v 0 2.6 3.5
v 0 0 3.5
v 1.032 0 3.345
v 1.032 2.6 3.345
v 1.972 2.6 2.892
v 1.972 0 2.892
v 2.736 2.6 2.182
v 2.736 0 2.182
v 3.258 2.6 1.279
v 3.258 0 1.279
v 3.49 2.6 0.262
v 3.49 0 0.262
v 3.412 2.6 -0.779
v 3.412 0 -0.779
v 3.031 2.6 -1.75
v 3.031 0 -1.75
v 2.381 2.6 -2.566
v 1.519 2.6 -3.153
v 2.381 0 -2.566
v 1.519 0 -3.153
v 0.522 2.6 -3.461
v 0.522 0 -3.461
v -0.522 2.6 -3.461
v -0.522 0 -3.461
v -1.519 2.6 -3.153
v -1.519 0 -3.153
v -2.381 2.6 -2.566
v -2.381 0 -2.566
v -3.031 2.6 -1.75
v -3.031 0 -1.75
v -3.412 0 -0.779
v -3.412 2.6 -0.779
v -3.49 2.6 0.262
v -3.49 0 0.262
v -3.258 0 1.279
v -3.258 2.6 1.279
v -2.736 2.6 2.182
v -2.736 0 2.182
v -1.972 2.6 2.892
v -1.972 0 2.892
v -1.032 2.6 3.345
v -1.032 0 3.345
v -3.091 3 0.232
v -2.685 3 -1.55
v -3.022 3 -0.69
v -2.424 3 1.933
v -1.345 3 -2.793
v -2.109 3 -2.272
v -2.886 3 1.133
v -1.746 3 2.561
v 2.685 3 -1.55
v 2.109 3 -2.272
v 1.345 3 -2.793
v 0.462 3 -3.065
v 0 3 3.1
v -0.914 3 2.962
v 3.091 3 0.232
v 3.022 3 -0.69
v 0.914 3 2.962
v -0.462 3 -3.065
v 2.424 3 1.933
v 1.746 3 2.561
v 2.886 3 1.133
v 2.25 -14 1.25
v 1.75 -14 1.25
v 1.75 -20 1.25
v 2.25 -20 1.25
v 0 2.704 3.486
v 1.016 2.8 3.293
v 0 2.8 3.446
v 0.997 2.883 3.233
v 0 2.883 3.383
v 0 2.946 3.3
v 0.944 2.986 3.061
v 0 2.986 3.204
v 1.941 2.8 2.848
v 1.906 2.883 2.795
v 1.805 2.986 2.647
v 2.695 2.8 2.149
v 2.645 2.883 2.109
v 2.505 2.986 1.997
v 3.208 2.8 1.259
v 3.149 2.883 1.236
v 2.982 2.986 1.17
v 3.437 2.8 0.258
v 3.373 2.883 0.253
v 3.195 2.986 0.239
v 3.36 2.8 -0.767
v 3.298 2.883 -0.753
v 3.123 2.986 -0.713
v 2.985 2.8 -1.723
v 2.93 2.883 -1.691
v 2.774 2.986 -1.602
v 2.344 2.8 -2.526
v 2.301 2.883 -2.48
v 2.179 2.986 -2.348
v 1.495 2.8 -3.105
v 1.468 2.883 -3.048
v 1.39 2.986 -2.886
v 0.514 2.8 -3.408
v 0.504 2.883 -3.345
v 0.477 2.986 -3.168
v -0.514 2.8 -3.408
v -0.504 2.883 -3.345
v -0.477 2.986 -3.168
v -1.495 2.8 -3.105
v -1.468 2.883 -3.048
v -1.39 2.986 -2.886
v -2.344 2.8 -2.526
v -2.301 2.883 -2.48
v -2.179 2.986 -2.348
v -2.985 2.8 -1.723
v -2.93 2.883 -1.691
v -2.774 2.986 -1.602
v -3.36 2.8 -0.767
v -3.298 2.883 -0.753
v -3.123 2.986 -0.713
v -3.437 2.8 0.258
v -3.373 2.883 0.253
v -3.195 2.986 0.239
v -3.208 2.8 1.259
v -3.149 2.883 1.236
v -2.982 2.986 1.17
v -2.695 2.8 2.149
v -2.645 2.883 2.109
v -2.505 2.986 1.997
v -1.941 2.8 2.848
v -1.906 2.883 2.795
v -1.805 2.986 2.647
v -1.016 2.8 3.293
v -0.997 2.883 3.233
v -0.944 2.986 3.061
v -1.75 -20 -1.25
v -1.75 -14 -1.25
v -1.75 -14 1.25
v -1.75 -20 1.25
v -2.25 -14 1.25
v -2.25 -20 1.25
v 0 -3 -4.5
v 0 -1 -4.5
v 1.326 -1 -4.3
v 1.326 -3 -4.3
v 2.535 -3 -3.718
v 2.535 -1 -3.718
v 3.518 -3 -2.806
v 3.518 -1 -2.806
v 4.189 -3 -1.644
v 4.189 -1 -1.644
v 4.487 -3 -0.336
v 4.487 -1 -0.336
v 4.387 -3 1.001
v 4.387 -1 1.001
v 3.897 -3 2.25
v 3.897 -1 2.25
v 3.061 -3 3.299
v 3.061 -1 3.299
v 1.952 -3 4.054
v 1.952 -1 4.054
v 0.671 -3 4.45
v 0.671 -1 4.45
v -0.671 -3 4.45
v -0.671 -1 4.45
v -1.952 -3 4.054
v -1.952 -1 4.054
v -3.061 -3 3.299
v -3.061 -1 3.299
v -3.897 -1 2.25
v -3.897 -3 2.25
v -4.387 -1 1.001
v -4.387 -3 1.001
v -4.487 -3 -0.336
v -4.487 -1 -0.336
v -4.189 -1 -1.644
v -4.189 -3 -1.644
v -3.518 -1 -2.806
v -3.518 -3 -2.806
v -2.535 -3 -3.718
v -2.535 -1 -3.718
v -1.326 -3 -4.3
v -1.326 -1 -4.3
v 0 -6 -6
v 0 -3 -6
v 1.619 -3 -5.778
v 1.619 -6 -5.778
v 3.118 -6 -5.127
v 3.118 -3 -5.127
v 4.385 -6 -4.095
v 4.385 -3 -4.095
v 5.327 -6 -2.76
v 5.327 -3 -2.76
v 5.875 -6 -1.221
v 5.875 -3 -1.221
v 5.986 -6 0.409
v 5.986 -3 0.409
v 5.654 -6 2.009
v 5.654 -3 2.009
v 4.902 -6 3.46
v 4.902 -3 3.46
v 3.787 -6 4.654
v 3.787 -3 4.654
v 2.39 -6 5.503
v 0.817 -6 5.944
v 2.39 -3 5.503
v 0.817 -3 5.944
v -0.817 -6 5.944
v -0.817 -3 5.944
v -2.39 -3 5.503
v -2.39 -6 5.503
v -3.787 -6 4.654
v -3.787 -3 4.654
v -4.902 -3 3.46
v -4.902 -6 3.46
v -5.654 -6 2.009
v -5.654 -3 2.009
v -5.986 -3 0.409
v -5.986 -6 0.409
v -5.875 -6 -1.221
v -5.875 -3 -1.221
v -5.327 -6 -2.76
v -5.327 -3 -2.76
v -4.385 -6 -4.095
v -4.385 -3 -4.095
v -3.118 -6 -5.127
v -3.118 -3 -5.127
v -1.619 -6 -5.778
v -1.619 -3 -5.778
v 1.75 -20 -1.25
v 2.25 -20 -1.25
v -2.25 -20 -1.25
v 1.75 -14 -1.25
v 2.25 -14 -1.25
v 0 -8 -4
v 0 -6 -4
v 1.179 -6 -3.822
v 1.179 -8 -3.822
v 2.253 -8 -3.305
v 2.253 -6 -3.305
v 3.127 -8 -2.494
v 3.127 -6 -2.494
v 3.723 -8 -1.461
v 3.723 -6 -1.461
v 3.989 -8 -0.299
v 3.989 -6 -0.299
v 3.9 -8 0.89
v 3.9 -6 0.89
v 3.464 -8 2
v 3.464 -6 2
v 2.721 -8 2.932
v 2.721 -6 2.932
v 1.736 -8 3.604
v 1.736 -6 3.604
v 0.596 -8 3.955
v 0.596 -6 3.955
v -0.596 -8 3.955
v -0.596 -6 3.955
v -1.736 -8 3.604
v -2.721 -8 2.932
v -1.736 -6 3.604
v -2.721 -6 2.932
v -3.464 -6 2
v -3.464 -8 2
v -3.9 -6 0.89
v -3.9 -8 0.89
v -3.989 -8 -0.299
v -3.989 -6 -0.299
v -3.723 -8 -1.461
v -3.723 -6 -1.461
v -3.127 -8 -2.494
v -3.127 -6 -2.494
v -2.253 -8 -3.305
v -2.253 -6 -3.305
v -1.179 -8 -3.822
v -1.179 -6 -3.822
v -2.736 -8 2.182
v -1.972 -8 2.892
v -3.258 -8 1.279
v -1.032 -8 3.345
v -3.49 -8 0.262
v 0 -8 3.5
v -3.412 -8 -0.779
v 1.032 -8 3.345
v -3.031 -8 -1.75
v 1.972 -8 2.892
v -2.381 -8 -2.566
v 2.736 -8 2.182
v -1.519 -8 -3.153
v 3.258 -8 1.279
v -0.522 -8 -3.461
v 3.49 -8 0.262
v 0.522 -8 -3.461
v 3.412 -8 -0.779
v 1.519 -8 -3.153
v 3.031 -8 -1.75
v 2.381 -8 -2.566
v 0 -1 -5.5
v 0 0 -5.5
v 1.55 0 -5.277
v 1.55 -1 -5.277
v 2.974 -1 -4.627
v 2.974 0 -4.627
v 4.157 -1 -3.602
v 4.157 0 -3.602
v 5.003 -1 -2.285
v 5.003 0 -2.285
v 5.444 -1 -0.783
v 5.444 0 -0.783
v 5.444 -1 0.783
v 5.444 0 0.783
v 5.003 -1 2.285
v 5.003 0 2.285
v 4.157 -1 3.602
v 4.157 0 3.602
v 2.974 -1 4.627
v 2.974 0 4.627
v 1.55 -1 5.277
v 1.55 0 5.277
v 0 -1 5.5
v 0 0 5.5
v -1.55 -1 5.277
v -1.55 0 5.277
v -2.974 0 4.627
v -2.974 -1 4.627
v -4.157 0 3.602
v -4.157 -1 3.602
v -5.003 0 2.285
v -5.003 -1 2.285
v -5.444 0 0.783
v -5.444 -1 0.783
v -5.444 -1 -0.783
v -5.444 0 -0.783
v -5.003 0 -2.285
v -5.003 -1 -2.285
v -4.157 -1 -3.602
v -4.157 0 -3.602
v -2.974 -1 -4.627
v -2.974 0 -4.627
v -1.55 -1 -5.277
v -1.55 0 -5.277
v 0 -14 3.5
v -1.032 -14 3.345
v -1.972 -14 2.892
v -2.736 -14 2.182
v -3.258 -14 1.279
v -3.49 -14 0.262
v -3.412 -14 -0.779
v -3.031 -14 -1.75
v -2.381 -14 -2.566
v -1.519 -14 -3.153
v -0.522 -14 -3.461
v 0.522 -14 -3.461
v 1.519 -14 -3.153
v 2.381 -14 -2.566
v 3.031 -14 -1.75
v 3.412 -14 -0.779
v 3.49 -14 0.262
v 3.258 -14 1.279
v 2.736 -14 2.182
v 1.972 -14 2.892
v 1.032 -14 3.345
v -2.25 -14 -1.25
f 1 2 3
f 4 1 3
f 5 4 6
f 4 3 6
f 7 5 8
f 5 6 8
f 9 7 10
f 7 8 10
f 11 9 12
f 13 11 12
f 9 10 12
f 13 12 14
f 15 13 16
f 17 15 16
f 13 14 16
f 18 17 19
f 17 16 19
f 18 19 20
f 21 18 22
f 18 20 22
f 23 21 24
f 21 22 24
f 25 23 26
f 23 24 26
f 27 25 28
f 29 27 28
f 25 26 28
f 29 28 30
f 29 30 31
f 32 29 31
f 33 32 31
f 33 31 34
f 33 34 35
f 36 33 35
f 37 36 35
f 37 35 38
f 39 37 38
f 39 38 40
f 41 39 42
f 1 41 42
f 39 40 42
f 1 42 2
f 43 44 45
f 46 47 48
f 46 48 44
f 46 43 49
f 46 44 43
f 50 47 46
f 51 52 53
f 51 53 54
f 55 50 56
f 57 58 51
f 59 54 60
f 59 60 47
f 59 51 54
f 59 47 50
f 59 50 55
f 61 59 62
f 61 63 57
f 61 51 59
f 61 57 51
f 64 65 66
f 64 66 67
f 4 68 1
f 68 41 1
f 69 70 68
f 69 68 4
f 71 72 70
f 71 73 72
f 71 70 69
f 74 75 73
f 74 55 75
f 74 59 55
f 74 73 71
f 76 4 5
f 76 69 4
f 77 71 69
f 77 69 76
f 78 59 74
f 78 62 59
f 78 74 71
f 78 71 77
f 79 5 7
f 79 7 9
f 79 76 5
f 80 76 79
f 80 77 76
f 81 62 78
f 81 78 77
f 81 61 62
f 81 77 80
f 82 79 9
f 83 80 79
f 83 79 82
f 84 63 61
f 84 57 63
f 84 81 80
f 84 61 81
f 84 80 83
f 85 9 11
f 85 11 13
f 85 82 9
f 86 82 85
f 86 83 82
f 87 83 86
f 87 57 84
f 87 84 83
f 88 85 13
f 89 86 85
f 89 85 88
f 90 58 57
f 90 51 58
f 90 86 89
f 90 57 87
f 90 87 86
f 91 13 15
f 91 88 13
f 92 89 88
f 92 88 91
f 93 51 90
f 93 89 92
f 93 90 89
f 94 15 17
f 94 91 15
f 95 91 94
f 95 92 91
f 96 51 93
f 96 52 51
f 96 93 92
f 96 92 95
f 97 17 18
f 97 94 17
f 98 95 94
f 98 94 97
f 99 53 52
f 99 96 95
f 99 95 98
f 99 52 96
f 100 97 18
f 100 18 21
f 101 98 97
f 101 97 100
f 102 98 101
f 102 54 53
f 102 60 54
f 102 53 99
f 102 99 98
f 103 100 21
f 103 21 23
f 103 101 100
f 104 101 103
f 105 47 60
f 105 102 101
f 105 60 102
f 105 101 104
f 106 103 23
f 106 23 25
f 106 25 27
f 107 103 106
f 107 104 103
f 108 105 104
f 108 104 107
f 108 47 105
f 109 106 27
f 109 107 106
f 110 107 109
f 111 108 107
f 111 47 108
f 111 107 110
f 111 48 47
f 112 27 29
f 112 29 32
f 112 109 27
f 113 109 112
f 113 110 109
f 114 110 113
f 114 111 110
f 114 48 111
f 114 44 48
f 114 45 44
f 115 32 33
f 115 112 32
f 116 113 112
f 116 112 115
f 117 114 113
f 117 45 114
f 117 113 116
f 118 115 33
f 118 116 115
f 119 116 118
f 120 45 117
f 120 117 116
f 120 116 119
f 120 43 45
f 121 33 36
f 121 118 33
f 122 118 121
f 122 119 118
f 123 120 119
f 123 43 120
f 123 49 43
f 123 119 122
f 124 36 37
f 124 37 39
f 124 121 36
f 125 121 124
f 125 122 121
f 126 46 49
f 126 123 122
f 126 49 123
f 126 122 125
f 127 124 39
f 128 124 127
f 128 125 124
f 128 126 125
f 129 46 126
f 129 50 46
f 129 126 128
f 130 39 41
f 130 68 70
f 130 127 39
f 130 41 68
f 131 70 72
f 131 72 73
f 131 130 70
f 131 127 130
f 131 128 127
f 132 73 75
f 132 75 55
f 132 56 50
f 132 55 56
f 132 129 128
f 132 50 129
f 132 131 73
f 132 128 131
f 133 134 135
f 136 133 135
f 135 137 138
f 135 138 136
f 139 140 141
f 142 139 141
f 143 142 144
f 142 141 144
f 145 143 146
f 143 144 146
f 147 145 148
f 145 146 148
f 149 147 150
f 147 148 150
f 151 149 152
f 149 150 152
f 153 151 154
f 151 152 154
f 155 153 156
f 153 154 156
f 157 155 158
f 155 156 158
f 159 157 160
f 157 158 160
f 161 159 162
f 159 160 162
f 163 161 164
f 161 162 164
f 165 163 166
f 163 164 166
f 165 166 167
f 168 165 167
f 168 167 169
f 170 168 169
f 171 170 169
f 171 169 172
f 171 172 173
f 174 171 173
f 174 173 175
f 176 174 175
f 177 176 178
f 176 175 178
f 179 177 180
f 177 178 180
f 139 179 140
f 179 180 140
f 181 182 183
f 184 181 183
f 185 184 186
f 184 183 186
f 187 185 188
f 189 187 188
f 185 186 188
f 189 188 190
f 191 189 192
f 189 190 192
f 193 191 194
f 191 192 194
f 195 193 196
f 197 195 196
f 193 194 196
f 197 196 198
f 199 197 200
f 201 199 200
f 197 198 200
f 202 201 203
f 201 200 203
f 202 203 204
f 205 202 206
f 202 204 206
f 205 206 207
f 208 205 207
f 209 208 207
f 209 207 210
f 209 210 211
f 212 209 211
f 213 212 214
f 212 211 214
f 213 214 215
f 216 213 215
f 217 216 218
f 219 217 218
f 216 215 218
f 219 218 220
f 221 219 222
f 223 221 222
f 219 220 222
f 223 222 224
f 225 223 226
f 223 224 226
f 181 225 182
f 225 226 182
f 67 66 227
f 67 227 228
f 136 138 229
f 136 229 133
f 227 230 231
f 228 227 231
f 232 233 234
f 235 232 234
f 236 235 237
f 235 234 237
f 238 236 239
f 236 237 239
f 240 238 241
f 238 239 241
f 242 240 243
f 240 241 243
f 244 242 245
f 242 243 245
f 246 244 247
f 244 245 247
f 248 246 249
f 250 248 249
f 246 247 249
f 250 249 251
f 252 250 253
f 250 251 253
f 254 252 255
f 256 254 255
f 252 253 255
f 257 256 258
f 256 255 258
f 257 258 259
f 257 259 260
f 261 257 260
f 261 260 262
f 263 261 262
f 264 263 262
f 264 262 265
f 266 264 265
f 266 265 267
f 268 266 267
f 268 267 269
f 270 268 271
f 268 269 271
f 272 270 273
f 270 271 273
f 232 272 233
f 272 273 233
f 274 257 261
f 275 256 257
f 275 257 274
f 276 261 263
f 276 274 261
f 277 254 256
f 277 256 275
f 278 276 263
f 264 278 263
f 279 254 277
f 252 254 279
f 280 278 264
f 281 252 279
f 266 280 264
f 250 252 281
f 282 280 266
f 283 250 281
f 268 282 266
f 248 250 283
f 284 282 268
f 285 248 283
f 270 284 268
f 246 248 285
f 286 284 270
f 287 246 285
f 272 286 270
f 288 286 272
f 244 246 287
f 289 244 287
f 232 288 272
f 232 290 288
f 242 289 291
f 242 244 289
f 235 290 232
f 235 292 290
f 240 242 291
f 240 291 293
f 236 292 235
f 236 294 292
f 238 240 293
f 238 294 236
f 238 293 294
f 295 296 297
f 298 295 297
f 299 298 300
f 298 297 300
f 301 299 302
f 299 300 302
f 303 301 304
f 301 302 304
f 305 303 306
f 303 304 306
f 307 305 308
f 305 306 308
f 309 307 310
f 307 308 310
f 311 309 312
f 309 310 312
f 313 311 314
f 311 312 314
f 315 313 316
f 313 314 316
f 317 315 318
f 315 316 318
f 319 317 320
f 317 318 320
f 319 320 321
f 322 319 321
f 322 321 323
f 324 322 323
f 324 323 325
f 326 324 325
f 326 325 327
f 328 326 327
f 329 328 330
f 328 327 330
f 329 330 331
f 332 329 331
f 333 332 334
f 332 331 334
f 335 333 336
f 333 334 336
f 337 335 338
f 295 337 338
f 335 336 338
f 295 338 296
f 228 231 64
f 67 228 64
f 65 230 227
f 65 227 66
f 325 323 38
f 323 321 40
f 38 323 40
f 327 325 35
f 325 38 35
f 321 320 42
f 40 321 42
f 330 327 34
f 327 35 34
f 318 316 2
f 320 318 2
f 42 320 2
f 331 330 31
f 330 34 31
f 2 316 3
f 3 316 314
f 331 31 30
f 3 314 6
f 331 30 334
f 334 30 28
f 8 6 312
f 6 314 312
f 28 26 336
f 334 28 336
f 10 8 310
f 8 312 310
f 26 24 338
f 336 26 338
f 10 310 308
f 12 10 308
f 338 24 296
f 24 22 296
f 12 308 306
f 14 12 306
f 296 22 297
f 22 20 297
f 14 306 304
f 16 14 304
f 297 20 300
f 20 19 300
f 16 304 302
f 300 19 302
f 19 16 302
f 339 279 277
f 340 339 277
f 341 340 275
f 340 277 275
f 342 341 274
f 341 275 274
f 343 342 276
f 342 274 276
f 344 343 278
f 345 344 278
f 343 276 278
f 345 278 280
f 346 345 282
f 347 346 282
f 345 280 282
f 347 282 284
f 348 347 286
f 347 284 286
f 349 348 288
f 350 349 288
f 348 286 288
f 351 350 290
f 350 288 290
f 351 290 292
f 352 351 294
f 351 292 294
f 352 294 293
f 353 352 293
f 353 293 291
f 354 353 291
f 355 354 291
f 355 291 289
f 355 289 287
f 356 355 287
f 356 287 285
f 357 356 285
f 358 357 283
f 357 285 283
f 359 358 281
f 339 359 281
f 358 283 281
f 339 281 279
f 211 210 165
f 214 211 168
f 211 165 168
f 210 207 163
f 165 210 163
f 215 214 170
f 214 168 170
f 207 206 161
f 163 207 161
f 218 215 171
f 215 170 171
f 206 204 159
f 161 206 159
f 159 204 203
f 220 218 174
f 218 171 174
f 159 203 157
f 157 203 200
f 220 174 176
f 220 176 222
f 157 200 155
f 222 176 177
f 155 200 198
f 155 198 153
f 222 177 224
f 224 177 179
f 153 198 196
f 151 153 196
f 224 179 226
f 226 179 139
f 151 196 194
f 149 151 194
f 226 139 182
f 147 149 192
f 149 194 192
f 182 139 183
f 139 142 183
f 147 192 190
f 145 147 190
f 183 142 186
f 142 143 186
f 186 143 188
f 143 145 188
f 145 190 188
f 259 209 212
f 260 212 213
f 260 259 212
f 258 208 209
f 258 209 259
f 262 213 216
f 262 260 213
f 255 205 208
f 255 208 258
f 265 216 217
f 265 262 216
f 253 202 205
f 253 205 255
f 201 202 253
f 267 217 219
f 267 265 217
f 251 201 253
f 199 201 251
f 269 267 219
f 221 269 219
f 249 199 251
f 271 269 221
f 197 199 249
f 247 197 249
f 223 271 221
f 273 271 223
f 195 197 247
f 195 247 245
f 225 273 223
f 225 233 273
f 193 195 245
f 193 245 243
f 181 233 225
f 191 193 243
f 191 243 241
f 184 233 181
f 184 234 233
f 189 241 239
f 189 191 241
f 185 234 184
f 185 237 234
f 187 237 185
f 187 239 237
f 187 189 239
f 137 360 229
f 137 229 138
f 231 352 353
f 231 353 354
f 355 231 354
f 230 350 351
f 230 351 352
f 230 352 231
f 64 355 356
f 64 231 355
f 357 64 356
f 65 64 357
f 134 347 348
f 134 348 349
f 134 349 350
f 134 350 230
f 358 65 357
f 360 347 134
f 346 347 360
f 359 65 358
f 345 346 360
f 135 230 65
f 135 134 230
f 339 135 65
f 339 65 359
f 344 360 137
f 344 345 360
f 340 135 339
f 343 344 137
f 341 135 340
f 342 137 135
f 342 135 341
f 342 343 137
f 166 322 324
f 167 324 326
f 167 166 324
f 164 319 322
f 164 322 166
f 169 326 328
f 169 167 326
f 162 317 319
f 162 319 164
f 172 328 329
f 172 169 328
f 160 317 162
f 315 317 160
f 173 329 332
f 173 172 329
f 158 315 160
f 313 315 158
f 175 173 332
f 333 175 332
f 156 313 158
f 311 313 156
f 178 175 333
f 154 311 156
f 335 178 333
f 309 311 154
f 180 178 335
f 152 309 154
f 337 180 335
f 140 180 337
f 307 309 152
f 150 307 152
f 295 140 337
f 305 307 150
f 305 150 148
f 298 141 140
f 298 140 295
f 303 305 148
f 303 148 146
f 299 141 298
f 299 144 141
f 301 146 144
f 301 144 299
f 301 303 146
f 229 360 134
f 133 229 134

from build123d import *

# Parameters (mm, degrees)
SKETCH1_R           = 3.5
BOSS_EXTRUDE1_DEPTH = 3
FILLET1_R           = 0.4
SKETCH2_R           = 5.5
SKETCH2_R_2         = 3.5
BOSS_EXTRUDE2_DEPTH = 1
SKETCH3_R           = 4.5
BOSS_EXTRUDE3_DEPTH = 2
SKETCH4_R           = 6
SKETCH4_R_2         = 4.5
BOSS_EXTRUDE4_DEPTH = 3
SKETCH5_R           = 4
BOSS_EXTRUDE5_DEPTH = 2
SKETCH7_R           = 3.5
BOSS_EXTRUDE6_DEPTH = 6
SKETCH8_W           = 0.5
SKETCH8_H           = 2.5
BOSS_EXTRUDE7_DEPTH = 6


with BuildPart() as part:
    # Sketch1 → Boss-Extrude1 (new body)
    with BuildSketch(Plane(origin=(0, 0, 0), x_dir=(1, 0, 0), z_dir=(0, 1, 0))):
        with Locations(Location((0, 0, 0), (0, 0, 270))):
            Circle(SKETCH1_R)
    extrude(amount=BOSS_EXTRUDE1_DEPTH)

    # Fillet1
    fillet1_edges = [part.edges().sort_by_distance(p)[0] for p in [
        (0, 3, -3.5),
    ]]
    fillet(fillet1_edges, radius=FILLET1_R)

    # Sketch2 → Boss-Extrude2 (add)
    with BuildSketch(Plane.XZ):
        with Locations(Location((0, 0, 0), (0, 0, 270))):
            Circle(SKETCH2_R)
        with Locations(Location((0, 0, 0), (0, 0, 90))):
            Circle(SKETCH2_R_2, mode=Mode.SUBTRACT)
        with Locations(Location((0, 0, 0), (0, 0, 90))):
            Circle(SKETCH2_R_2)
    extrude(amount=BOSS_EXTRUDE2_DEPTH)

    # Sketch3 → Boss-Extrude3 (add)
    with BuildSketch(Plane.XZ.offset(1)):
        with Locations(Location((0, 0, 0), (0, 0, 270))):
            Circle(SKETCH3_R)
    extrude(amount=BOSS_EXTRUDE3_DEPTH)

    # Sketch4 → Boss-Extrude4 (add)
    with BuildSketch(Plane.XZ.offset(3)):
        with Locations(Location((0, 0, 0), (0, 0, 270))):
            Circle(SKETCH4_R)
        with Locations(Location((0, 0, 0), (0, 0, 270))):
            Circle(SKETCH4_R_2, mode=Mode.SUBTRACT)
        with Locations(Location((0, 0, 0), (0, 0, 270))):
            Circle(SKETCH4_R_2)
    extrude(amount=BOSS_EXTRUDE4_DEPTH)

    # Sketch5 → Boss-Extrude5 (add)
    with BuildSketch(Plane.XZ.offset(6)):
        with Locations(Location((0, 0, 0), (0, 0, 270))):
            Circle(SKETCH5_R)
    extrude(amount=BOSS_EXTRUDE5_DEPTH)

    # Sketch7 → Boss-Extrude6 (add)
    with BuildSketch(Plane.XZ.offset(8)):
        with Locations(Location((0, 0, 0), (0, 0, 90))):
            Circle(SKETCH7_R)
    extrude(amount=BOSS_EXTRUDE6_DEPTH)

    # Sketch8 → Boss-Extrude7 (add)
    with BuildSketch(Plane.XZ.offset(14)):
        with Locations((2, 0)):
            Rectangle(SKETCH8_W, SKETCH8_H)
        with Locations((-2, 0)):
            Rectangle(SKETCH8_W, SKETCH8_H)
    extrude(amount=BOSS_EXTRUDE7_DEPTH)


solid = part.part
